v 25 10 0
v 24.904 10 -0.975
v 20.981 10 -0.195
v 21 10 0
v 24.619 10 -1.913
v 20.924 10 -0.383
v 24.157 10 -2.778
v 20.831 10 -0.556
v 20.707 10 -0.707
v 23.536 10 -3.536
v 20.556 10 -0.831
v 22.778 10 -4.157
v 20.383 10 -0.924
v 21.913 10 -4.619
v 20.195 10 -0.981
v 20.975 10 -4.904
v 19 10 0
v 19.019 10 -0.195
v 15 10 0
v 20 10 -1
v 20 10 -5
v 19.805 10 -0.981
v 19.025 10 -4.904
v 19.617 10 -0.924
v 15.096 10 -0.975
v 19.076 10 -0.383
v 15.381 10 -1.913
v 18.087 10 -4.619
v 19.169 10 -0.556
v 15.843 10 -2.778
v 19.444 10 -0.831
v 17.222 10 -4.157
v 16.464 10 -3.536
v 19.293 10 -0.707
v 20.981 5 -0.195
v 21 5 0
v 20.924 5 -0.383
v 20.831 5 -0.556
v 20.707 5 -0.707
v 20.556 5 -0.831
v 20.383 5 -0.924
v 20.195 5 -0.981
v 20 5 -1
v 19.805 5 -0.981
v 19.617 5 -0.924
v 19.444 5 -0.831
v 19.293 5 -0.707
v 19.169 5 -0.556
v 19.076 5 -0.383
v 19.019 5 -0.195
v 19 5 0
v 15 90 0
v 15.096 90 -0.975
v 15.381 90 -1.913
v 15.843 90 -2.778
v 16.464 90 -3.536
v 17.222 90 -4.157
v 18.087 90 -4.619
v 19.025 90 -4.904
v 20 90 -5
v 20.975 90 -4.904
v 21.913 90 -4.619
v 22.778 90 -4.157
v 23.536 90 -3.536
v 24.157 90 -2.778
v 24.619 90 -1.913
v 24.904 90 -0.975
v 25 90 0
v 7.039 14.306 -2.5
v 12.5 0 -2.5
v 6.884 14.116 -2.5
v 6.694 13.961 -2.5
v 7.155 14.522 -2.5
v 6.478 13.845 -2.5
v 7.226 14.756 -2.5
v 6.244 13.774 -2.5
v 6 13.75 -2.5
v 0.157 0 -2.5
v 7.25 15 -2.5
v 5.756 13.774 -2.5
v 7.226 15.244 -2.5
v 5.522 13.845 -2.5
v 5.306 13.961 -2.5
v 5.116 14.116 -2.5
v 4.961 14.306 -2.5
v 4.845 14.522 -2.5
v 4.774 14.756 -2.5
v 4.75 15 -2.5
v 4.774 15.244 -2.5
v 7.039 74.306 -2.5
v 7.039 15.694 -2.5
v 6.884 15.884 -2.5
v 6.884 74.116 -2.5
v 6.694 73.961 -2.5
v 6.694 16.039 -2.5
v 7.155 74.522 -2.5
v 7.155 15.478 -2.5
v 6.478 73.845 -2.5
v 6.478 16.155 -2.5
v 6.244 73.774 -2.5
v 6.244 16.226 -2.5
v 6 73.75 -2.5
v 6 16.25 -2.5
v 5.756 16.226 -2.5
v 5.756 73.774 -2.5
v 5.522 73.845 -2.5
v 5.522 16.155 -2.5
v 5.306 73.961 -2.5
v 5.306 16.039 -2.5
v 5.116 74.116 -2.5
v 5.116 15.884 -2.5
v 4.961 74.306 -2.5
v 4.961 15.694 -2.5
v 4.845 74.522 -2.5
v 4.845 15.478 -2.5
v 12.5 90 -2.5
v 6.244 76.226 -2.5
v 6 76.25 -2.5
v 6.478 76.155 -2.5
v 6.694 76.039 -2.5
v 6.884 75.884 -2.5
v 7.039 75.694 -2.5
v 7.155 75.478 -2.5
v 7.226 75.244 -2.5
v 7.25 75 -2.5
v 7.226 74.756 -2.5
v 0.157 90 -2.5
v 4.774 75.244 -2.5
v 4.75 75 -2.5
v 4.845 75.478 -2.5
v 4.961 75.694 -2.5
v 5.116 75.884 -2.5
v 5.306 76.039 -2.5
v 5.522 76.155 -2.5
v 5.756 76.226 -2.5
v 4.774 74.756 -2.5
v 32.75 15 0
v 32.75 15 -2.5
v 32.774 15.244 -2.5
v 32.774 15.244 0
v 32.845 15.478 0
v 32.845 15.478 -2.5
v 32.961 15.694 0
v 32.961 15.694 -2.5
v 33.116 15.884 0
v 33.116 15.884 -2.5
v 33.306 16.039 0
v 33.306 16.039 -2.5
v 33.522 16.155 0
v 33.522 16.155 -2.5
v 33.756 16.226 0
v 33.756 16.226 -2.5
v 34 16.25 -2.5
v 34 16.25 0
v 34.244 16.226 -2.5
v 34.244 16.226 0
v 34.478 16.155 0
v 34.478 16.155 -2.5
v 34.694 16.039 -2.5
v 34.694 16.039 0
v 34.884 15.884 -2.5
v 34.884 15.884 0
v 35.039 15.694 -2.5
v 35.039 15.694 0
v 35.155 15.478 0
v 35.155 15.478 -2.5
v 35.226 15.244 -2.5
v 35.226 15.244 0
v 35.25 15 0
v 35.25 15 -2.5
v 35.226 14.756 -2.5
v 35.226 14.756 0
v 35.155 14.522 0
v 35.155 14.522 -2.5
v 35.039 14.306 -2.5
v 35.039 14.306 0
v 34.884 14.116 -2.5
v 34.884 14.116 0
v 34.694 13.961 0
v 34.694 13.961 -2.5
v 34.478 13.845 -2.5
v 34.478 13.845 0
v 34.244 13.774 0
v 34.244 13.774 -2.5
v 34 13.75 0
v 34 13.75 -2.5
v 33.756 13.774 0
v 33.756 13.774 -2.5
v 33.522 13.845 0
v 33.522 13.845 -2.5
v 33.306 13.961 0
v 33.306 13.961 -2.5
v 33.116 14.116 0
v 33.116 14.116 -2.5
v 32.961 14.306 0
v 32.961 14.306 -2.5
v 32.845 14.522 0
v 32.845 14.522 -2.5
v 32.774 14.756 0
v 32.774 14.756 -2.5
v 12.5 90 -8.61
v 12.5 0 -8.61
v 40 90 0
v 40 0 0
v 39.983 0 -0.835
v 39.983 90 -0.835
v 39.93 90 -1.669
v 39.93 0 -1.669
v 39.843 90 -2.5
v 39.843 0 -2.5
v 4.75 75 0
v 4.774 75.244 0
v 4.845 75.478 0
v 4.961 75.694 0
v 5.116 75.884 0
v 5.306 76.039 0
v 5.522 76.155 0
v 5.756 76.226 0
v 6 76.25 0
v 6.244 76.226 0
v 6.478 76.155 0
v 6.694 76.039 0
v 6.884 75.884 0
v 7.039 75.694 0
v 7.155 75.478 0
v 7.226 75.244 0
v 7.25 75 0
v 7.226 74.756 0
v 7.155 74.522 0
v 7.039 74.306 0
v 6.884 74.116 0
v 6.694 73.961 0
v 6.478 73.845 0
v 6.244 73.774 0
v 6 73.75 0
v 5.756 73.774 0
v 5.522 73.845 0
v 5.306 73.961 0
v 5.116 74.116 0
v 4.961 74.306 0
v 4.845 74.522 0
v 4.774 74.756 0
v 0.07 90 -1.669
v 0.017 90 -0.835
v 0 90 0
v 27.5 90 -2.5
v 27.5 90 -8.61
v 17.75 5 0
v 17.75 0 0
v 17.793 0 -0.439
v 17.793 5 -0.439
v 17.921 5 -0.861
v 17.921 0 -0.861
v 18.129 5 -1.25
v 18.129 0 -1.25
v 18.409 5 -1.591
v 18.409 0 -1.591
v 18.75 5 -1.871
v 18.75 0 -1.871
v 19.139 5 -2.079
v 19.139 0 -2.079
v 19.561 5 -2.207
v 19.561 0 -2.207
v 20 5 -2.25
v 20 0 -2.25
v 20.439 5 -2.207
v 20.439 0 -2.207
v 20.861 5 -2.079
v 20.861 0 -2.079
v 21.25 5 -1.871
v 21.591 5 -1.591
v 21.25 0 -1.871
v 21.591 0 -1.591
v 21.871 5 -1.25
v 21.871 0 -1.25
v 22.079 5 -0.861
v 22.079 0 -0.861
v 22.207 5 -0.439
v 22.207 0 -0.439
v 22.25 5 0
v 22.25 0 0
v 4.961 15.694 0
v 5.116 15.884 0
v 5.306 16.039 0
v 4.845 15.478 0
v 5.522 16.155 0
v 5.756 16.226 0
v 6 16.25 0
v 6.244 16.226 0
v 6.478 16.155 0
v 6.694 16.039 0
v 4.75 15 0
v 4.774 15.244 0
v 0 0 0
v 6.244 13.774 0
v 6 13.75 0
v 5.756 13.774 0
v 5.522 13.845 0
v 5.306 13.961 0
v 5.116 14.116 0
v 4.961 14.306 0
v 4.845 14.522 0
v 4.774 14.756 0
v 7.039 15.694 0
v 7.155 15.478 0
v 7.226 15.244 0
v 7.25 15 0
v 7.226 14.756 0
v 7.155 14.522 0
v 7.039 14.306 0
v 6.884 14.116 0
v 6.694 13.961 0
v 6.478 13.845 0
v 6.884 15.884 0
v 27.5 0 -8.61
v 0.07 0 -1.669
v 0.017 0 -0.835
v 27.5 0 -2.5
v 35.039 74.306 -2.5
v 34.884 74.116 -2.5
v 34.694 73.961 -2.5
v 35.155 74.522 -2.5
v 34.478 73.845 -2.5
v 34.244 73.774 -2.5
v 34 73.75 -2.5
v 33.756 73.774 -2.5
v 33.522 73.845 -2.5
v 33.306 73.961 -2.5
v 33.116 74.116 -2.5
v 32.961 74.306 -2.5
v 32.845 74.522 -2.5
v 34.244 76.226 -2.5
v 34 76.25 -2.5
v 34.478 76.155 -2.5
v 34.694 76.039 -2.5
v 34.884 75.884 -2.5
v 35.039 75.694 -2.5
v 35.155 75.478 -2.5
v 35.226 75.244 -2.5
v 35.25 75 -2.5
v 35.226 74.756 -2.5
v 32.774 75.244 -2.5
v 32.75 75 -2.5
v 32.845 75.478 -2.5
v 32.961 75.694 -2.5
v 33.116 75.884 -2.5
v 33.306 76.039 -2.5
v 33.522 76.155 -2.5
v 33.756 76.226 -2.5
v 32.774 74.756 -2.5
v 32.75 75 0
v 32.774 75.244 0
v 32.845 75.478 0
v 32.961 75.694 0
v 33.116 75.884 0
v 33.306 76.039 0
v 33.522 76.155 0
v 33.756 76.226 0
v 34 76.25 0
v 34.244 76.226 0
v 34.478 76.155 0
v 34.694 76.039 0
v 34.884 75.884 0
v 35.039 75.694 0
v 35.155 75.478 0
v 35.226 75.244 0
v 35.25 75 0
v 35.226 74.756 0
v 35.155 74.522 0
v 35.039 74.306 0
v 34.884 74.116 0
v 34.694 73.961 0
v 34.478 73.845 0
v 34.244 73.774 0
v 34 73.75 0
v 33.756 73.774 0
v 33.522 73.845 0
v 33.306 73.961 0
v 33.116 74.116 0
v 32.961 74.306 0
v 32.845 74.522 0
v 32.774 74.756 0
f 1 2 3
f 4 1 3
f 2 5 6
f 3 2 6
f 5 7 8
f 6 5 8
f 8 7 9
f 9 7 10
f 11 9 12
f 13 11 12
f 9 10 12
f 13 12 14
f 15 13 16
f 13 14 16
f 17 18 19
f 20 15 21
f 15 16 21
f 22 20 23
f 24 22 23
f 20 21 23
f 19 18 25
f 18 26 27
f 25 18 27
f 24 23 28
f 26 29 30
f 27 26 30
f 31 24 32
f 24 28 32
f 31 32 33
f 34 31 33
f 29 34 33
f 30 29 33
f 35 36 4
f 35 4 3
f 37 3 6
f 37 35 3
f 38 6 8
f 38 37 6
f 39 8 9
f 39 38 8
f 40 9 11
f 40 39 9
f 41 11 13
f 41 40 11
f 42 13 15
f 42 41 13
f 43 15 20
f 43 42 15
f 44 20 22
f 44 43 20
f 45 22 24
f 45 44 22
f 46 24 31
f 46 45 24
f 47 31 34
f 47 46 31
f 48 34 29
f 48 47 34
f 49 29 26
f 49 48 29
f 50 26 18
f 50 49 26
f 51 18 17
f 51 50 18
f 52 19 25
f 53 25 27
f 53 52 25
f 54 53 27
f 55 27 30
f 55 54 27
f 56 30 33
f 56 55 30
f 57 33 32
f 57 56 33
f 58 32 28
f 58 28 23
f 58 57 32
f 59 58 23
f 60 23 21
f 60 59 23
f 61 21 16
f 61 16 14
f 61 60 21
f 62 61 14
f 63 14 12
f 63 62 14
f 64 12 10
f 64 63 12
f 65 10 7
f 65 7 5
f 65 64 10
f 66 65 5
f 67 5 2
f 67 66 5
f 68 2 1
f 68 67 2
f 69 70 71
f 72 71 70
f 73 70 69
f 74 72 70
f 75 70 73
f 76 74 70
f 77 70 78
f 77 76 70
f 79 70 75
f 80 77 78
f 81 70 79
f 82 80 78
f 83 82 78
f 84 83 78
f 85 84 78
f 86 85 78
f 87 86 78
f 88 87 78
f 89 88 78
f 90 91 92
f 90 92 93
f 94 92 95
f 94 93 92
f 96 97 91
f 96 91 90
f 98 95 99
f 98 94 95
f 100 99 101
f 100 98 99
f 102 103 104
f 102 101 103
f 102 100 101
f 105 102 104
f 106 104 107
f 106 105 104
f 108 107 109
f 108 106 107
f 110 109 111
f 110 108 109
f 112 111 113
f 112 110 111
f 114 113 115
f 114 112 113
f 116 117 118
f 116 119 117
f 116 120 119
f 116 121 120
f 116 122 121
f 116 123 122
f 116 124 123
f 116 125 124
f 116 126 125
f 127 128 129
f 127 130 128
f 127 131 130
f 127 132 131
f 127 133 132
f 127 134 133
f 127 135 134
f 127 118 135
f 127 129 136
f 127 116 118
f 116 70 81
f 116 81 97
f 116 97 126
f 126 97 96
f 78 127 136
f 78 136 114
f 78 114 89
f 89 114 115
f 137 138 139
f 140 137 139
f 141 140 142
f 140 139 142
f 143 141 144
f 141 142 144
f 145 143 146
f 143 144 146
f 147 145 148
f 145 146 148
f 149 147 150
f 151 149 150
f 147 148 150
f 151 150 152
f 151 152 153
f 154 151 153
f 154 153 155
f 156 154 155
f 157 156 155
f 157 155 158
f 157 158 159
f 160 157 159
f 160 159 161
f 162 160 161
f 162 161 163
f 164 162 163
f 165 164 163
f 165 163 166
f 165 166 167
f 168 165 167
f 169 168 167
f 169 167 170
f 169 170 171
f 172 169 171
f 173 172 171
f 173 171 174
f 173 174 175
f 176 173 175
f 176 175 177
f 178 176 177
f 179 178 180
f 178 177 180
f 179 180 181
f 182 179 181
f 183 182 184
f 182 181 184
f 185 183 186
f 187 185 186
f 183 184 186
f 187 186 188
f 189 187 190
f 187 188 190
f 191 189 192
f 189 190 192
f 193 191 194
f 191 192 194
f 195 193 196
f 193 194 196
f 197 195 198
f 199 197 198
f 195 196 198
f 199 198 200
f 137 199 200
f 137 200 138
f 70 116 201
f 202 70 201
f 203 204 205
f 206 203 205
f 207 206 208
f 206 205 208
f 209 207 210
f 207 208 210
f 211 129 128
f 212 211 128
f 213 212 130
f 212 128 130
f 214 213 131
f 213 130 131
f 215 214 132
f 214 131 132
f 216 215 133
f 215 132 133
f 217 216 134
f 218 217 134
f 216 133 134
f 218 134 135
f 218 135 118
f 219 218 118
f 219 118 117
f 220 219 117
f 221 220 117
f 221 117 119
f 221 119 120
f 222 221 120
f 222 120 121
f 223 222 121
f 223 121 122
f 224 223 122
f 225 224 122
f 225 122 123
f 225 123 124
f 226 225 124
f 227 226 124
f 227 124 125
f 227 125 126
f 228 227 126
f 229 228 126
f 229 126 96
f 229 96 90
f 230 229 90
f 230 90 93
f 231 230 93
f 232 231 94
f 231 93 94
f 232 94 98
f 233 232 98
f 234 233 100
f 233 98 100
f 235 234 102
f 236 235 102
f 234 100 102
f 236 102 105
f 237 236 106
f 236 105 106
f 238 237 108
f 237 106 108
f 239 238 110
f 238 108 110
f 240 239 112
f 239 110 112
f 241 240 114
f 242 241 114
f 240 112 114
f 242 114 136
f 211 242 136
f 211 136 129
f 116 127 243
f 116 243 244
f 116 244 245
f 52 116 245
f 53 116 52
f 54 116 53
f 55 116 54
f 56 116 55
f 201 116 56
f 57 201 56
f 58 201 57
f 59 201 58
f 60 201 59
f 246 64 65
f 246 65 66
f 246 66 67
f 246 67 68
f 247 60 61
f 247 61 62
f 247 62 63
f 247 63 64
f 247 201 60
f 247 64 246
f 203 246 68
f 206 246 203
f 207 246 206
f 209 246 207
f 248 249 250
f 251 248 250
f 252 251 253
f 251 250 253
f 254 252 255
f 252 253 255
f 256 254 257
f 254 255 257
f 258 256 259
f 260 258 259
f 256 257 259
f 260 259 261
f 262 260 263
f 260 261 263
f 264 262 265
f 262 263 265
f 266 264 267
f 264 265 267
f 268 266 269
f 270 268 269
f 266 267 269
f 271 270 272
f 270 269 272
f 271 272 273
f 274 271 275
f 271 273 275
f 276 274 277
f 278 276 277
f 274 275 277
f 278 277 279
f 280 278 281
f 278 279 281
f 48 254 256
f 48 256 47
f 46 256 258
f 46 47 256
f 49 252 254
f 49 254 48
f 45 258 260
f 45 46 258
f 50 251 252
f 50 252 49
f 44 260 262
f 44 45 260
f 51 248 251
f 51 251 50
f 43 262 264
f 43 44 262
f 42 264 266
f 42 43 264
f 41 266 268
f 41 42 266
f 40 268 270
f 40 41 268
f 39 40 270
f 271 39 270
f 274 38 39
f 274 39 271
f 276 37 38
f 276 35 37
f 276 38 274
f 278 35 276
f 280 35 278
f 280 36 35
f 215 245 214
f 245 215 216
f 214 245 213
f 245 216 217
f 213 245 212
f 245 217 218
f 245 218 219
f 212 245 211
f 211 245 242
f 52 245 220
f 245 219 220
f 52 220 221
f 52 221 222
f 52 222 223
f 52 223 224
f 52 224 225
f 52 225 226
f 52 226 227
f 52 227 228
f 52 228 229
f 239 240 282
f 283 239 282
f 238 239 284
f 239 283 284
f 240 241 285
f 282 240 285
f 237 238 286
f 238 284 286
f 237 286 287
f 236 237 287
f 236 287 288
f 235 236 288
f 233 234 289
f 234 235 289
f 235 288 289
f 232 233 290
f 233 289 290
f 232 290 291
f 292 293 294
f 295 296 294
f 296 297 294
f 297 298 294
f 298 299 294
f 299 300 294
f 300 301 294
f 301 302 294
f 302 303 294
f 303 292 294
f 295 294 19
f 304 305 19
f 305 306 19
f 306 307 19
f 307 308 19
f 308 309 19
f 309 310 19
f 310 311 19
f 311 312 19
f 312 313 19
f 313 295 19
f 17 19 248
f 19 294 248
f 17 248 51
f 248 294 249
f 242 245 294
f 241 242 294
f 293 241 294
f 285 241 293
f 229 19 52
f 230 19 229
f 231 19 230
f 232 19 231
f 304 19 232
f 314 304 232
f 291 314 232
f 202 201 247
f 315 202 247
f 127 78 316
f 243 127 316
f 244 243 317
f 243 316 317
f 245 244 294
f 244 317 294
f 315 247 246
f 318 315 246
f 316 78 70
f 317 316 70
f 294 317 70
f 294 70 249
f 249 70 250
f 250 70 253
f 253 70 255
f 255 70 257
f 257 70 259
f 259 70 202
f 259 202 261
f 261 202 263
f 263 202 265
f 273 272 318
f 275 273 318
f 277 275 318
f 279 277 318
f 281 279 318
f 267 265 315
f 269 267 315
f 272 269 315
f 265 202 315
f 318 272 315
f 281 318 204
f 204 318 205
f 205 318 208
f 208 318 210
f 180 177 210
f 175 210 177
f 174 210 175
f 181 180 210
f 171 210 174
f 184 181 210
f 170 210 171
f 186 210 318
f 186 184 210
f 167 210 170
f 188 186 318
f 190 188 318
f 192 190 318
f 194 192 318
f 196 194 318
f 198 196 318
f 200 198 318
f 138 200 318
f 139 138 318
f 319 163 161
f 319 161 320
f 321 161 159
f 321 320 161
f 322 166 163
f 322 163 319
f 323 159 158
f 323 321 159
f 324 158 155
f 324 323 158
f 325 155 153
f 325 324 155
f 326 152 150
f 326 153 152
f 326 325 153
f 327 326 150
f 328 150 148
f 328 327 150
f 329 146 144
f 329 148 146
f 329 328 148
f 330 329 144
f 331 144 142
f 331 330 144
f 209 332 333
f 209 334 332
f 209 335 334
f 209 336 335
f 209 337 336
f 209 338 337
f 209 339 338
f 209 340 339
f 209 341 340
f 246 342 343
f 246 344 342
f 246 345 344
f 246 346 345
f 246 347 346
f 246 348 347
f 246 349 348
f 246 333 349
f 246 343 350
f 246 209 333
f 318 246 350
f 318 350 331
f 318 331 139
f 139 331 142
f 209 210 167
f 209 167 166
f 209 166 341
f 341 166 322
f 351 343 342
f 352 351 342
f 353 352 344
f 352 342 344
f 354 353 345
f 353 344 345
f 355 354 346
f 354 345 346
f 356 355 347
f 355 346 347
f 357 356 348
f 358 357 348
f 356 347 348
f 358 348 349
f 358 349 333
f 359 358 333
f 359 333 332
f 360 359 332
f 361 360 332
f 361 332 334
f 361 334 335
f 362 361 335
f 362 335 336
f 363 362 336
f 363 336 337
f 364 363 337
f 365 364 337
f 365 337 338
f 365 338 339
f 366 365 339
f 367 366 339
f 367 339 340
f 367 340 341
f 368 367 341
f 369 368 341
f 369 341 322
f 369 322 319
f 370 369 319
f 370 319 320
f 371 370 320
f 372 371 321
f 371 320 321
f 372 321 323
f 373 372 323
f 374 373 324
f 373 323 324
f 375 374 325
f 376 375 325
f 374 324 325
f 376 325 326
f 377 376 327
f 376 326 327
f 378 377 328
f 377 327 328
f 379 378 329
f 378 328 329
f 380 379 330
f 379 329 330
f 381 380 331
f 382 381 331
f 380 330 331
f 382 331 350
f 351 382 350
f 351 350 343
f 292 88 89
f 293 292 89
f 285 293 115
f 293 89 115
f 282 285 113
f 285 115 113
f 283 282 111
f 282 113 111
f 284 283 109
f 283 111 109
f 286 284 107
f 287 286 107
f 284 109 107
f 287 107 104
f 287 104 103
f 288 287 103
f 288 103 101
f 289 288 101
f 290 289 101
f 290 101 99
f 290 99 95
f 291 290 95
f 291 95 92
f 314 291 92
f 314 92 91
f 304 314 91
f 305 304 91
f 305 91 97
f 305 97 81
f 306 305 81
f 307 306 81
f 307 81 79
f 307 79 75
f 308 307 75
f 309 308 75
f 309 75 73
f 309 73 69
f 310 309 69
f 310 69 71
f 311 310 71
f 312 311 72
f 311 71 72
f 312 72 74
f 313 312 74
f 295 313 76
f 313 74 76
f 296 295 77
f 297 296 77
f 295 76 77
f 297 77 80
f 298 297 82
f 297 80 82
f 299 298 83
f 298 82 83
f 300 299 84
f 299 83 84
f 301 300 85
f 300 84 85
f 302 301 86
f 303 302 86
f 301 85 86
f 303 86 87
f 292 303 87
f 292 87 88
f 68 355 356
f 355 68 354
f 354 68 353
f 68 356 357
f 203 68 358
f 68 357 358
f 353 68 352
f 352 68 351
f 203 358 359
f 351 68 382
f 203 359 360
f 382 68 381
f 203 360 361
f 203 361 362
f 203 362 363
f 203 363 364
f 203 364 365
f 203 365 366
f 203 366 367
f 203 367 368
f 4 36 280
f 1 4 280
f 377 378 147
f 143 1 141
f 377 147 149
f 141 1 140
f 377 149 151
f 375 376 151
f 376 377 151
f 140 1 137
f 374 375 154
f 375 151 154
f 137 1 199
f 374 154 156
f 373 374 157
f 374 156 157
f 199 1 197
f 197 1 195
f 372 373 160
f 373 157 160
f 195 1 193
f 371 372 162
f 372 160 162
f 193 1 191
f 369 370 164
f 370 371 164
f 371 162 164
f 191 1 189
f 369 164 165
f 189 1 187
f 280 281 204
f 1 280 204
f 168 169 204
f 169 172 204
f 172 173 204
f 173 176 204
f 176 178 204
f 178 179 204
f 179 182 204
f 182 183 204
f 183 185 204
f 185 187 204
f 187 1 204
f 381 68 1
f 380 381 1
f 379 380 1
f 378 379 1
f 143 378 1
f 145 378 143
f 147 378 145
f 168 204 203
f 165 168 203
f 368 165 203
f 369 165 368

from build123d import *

# Parameters (mm, degrees)
AUFSATZ_LINEAR_AUSTRAGEN1_DEPTH       = 90
AUFSATZ_LINEAR_AUSTRAGEN1_DEPTH_BACK  = 0.0001
SCHNITT_LINEAR_AUSTRAGEN1_DEPTH       = 80
AUFSATZ_LINEAR_START                  = -10.0001
AUFSATZ_LINEAR_AUSTRAGEN2_DEPTH       = 10.0001
SKIZZE45_R                            = 2.25
SCHNITT_LINEAR_AUSTRAGEN9_DEPTH       = 5
SCHNITT_LINEAR_AUSTRAGEN16_DEPTH      = 101.498845765
SCHNITT_LINEAR_AUSTRAGEN16_DEPTH_BACK = 101.498845765
F_2_5_2_5_DURCHMESSER_BOHRUNG1_D      = 2.5


# Read off the part's stored shape, not the designer's step: Aufsatz-Linear austragen2
with BuildPart() as part:
    # Skizze1 → Aufsatz-Linear austragen1 (new, two sides: drawn at the far end of the back side and taken through both)
    with BuildSketch(Plane(origin=(0, 0, 0), x_dir=(1, 0, 0), z_dir=(0, 1, 0)).offset(-AUFSATZ_LINEAR_AUSTRAGEN1_DEPTH_BACK)):
        with BuildLine():
            Line((0, 0), (40, 0))
            ThreePointArc((40, 0), (20, 20), (0, 0))
        make_face()
    extrude(amount=AUFSATZ_LINEAR_AUSTRAGEN1_DEPTH + AUFSATZ_LINEAR_AUSTRAGEN1_DEPTH_BACK)

    # Skizze15 → Schnitt-Linear austragen1 (cut)
    with BuildSketch(Plane(origin=(0, 90, 0), x_dir=(1, 0, 0), z_dir=(0, 1, 0))):
        with BuildLine():
            Line((25, 0), (15, 0))
            ThreePointArc((15, 0), (20, 5), (25, 0))
        make_face()
    extrude(amount=-SCHNITT_LINEAR_AUSTRAGEN1_DEPTH, mode=Mode.SUBTRACT)

    # Aufsatz-Linear austragen2 outline → Aufsatz-Linear austragen2 (cut)
    with BuildSketch(Plane(origin=(0, 10, 0), x_dir=(1, 0, 0), z_dir=(0, 1, 0)).offset(AUFSATZ_LINEAR_START)):
        with BuildLine():
            Line((19, 0), (21, 0))
            ThreePointArc((21, 0), (20, 1), (19, 0))
        make_face()
    extrude(amount=AUFSATZ_LINEAR_AUSTRAGEN2_DEPTH, mode=Mode.SUBTRACT)

    # Skizze45 → Schnitt-Linear austragen9 (cut)
    with BuildSketch(Plane.XZ.offset(0.0001)):
        with Locations((20, 0)):
            Circle(SKIZZE45_R)
    extrude(amount=-SCHNITT_LINEAR_AUSTRAGEN9_DEPTH, mode=Mode.SUBTRACT)

    # Skizze47 → Schnitt-Linear austragen16 (cut, two sides: drawn at the far end of the back side and taken through both)
    with BuildSketch(Plane.XZ.offset(0.0001).offset(-SCHNITT_LINEAR_AUSTRAGEN16_DEPTH_BACK)):
        Polygon((-96.877045312, -2.5), (0.156865167, -2.5), (12.5, -2.5), (12.5, -8.61), (27.5, -8.61), (27.5, -2.5), (39.843134833, -2.5), (136.877045312, -2.5), (136.877045312, -196.567820958), (-96.877045312, -196.567820958), align=None)
    extrude(amount=SCHNITT_LINEAR_AUSTRAGEN16_DEPTH + SCHNITT_LINEAR_AUSTRAGEN16_DEPTH_BACK, mode=Mode.SUBTRACT)

    # Ø2.5 (2.5) Durchmesser Bohrung1 (through all)
    with Locations(Plane.XY):
        with Locations((6, 75), (6, 15), (34, 75), (34, 15)):
            Hole(F_2_5_2_5_DURCHMESSER_BOHRUNG1_D / 2)


solid = part.part
